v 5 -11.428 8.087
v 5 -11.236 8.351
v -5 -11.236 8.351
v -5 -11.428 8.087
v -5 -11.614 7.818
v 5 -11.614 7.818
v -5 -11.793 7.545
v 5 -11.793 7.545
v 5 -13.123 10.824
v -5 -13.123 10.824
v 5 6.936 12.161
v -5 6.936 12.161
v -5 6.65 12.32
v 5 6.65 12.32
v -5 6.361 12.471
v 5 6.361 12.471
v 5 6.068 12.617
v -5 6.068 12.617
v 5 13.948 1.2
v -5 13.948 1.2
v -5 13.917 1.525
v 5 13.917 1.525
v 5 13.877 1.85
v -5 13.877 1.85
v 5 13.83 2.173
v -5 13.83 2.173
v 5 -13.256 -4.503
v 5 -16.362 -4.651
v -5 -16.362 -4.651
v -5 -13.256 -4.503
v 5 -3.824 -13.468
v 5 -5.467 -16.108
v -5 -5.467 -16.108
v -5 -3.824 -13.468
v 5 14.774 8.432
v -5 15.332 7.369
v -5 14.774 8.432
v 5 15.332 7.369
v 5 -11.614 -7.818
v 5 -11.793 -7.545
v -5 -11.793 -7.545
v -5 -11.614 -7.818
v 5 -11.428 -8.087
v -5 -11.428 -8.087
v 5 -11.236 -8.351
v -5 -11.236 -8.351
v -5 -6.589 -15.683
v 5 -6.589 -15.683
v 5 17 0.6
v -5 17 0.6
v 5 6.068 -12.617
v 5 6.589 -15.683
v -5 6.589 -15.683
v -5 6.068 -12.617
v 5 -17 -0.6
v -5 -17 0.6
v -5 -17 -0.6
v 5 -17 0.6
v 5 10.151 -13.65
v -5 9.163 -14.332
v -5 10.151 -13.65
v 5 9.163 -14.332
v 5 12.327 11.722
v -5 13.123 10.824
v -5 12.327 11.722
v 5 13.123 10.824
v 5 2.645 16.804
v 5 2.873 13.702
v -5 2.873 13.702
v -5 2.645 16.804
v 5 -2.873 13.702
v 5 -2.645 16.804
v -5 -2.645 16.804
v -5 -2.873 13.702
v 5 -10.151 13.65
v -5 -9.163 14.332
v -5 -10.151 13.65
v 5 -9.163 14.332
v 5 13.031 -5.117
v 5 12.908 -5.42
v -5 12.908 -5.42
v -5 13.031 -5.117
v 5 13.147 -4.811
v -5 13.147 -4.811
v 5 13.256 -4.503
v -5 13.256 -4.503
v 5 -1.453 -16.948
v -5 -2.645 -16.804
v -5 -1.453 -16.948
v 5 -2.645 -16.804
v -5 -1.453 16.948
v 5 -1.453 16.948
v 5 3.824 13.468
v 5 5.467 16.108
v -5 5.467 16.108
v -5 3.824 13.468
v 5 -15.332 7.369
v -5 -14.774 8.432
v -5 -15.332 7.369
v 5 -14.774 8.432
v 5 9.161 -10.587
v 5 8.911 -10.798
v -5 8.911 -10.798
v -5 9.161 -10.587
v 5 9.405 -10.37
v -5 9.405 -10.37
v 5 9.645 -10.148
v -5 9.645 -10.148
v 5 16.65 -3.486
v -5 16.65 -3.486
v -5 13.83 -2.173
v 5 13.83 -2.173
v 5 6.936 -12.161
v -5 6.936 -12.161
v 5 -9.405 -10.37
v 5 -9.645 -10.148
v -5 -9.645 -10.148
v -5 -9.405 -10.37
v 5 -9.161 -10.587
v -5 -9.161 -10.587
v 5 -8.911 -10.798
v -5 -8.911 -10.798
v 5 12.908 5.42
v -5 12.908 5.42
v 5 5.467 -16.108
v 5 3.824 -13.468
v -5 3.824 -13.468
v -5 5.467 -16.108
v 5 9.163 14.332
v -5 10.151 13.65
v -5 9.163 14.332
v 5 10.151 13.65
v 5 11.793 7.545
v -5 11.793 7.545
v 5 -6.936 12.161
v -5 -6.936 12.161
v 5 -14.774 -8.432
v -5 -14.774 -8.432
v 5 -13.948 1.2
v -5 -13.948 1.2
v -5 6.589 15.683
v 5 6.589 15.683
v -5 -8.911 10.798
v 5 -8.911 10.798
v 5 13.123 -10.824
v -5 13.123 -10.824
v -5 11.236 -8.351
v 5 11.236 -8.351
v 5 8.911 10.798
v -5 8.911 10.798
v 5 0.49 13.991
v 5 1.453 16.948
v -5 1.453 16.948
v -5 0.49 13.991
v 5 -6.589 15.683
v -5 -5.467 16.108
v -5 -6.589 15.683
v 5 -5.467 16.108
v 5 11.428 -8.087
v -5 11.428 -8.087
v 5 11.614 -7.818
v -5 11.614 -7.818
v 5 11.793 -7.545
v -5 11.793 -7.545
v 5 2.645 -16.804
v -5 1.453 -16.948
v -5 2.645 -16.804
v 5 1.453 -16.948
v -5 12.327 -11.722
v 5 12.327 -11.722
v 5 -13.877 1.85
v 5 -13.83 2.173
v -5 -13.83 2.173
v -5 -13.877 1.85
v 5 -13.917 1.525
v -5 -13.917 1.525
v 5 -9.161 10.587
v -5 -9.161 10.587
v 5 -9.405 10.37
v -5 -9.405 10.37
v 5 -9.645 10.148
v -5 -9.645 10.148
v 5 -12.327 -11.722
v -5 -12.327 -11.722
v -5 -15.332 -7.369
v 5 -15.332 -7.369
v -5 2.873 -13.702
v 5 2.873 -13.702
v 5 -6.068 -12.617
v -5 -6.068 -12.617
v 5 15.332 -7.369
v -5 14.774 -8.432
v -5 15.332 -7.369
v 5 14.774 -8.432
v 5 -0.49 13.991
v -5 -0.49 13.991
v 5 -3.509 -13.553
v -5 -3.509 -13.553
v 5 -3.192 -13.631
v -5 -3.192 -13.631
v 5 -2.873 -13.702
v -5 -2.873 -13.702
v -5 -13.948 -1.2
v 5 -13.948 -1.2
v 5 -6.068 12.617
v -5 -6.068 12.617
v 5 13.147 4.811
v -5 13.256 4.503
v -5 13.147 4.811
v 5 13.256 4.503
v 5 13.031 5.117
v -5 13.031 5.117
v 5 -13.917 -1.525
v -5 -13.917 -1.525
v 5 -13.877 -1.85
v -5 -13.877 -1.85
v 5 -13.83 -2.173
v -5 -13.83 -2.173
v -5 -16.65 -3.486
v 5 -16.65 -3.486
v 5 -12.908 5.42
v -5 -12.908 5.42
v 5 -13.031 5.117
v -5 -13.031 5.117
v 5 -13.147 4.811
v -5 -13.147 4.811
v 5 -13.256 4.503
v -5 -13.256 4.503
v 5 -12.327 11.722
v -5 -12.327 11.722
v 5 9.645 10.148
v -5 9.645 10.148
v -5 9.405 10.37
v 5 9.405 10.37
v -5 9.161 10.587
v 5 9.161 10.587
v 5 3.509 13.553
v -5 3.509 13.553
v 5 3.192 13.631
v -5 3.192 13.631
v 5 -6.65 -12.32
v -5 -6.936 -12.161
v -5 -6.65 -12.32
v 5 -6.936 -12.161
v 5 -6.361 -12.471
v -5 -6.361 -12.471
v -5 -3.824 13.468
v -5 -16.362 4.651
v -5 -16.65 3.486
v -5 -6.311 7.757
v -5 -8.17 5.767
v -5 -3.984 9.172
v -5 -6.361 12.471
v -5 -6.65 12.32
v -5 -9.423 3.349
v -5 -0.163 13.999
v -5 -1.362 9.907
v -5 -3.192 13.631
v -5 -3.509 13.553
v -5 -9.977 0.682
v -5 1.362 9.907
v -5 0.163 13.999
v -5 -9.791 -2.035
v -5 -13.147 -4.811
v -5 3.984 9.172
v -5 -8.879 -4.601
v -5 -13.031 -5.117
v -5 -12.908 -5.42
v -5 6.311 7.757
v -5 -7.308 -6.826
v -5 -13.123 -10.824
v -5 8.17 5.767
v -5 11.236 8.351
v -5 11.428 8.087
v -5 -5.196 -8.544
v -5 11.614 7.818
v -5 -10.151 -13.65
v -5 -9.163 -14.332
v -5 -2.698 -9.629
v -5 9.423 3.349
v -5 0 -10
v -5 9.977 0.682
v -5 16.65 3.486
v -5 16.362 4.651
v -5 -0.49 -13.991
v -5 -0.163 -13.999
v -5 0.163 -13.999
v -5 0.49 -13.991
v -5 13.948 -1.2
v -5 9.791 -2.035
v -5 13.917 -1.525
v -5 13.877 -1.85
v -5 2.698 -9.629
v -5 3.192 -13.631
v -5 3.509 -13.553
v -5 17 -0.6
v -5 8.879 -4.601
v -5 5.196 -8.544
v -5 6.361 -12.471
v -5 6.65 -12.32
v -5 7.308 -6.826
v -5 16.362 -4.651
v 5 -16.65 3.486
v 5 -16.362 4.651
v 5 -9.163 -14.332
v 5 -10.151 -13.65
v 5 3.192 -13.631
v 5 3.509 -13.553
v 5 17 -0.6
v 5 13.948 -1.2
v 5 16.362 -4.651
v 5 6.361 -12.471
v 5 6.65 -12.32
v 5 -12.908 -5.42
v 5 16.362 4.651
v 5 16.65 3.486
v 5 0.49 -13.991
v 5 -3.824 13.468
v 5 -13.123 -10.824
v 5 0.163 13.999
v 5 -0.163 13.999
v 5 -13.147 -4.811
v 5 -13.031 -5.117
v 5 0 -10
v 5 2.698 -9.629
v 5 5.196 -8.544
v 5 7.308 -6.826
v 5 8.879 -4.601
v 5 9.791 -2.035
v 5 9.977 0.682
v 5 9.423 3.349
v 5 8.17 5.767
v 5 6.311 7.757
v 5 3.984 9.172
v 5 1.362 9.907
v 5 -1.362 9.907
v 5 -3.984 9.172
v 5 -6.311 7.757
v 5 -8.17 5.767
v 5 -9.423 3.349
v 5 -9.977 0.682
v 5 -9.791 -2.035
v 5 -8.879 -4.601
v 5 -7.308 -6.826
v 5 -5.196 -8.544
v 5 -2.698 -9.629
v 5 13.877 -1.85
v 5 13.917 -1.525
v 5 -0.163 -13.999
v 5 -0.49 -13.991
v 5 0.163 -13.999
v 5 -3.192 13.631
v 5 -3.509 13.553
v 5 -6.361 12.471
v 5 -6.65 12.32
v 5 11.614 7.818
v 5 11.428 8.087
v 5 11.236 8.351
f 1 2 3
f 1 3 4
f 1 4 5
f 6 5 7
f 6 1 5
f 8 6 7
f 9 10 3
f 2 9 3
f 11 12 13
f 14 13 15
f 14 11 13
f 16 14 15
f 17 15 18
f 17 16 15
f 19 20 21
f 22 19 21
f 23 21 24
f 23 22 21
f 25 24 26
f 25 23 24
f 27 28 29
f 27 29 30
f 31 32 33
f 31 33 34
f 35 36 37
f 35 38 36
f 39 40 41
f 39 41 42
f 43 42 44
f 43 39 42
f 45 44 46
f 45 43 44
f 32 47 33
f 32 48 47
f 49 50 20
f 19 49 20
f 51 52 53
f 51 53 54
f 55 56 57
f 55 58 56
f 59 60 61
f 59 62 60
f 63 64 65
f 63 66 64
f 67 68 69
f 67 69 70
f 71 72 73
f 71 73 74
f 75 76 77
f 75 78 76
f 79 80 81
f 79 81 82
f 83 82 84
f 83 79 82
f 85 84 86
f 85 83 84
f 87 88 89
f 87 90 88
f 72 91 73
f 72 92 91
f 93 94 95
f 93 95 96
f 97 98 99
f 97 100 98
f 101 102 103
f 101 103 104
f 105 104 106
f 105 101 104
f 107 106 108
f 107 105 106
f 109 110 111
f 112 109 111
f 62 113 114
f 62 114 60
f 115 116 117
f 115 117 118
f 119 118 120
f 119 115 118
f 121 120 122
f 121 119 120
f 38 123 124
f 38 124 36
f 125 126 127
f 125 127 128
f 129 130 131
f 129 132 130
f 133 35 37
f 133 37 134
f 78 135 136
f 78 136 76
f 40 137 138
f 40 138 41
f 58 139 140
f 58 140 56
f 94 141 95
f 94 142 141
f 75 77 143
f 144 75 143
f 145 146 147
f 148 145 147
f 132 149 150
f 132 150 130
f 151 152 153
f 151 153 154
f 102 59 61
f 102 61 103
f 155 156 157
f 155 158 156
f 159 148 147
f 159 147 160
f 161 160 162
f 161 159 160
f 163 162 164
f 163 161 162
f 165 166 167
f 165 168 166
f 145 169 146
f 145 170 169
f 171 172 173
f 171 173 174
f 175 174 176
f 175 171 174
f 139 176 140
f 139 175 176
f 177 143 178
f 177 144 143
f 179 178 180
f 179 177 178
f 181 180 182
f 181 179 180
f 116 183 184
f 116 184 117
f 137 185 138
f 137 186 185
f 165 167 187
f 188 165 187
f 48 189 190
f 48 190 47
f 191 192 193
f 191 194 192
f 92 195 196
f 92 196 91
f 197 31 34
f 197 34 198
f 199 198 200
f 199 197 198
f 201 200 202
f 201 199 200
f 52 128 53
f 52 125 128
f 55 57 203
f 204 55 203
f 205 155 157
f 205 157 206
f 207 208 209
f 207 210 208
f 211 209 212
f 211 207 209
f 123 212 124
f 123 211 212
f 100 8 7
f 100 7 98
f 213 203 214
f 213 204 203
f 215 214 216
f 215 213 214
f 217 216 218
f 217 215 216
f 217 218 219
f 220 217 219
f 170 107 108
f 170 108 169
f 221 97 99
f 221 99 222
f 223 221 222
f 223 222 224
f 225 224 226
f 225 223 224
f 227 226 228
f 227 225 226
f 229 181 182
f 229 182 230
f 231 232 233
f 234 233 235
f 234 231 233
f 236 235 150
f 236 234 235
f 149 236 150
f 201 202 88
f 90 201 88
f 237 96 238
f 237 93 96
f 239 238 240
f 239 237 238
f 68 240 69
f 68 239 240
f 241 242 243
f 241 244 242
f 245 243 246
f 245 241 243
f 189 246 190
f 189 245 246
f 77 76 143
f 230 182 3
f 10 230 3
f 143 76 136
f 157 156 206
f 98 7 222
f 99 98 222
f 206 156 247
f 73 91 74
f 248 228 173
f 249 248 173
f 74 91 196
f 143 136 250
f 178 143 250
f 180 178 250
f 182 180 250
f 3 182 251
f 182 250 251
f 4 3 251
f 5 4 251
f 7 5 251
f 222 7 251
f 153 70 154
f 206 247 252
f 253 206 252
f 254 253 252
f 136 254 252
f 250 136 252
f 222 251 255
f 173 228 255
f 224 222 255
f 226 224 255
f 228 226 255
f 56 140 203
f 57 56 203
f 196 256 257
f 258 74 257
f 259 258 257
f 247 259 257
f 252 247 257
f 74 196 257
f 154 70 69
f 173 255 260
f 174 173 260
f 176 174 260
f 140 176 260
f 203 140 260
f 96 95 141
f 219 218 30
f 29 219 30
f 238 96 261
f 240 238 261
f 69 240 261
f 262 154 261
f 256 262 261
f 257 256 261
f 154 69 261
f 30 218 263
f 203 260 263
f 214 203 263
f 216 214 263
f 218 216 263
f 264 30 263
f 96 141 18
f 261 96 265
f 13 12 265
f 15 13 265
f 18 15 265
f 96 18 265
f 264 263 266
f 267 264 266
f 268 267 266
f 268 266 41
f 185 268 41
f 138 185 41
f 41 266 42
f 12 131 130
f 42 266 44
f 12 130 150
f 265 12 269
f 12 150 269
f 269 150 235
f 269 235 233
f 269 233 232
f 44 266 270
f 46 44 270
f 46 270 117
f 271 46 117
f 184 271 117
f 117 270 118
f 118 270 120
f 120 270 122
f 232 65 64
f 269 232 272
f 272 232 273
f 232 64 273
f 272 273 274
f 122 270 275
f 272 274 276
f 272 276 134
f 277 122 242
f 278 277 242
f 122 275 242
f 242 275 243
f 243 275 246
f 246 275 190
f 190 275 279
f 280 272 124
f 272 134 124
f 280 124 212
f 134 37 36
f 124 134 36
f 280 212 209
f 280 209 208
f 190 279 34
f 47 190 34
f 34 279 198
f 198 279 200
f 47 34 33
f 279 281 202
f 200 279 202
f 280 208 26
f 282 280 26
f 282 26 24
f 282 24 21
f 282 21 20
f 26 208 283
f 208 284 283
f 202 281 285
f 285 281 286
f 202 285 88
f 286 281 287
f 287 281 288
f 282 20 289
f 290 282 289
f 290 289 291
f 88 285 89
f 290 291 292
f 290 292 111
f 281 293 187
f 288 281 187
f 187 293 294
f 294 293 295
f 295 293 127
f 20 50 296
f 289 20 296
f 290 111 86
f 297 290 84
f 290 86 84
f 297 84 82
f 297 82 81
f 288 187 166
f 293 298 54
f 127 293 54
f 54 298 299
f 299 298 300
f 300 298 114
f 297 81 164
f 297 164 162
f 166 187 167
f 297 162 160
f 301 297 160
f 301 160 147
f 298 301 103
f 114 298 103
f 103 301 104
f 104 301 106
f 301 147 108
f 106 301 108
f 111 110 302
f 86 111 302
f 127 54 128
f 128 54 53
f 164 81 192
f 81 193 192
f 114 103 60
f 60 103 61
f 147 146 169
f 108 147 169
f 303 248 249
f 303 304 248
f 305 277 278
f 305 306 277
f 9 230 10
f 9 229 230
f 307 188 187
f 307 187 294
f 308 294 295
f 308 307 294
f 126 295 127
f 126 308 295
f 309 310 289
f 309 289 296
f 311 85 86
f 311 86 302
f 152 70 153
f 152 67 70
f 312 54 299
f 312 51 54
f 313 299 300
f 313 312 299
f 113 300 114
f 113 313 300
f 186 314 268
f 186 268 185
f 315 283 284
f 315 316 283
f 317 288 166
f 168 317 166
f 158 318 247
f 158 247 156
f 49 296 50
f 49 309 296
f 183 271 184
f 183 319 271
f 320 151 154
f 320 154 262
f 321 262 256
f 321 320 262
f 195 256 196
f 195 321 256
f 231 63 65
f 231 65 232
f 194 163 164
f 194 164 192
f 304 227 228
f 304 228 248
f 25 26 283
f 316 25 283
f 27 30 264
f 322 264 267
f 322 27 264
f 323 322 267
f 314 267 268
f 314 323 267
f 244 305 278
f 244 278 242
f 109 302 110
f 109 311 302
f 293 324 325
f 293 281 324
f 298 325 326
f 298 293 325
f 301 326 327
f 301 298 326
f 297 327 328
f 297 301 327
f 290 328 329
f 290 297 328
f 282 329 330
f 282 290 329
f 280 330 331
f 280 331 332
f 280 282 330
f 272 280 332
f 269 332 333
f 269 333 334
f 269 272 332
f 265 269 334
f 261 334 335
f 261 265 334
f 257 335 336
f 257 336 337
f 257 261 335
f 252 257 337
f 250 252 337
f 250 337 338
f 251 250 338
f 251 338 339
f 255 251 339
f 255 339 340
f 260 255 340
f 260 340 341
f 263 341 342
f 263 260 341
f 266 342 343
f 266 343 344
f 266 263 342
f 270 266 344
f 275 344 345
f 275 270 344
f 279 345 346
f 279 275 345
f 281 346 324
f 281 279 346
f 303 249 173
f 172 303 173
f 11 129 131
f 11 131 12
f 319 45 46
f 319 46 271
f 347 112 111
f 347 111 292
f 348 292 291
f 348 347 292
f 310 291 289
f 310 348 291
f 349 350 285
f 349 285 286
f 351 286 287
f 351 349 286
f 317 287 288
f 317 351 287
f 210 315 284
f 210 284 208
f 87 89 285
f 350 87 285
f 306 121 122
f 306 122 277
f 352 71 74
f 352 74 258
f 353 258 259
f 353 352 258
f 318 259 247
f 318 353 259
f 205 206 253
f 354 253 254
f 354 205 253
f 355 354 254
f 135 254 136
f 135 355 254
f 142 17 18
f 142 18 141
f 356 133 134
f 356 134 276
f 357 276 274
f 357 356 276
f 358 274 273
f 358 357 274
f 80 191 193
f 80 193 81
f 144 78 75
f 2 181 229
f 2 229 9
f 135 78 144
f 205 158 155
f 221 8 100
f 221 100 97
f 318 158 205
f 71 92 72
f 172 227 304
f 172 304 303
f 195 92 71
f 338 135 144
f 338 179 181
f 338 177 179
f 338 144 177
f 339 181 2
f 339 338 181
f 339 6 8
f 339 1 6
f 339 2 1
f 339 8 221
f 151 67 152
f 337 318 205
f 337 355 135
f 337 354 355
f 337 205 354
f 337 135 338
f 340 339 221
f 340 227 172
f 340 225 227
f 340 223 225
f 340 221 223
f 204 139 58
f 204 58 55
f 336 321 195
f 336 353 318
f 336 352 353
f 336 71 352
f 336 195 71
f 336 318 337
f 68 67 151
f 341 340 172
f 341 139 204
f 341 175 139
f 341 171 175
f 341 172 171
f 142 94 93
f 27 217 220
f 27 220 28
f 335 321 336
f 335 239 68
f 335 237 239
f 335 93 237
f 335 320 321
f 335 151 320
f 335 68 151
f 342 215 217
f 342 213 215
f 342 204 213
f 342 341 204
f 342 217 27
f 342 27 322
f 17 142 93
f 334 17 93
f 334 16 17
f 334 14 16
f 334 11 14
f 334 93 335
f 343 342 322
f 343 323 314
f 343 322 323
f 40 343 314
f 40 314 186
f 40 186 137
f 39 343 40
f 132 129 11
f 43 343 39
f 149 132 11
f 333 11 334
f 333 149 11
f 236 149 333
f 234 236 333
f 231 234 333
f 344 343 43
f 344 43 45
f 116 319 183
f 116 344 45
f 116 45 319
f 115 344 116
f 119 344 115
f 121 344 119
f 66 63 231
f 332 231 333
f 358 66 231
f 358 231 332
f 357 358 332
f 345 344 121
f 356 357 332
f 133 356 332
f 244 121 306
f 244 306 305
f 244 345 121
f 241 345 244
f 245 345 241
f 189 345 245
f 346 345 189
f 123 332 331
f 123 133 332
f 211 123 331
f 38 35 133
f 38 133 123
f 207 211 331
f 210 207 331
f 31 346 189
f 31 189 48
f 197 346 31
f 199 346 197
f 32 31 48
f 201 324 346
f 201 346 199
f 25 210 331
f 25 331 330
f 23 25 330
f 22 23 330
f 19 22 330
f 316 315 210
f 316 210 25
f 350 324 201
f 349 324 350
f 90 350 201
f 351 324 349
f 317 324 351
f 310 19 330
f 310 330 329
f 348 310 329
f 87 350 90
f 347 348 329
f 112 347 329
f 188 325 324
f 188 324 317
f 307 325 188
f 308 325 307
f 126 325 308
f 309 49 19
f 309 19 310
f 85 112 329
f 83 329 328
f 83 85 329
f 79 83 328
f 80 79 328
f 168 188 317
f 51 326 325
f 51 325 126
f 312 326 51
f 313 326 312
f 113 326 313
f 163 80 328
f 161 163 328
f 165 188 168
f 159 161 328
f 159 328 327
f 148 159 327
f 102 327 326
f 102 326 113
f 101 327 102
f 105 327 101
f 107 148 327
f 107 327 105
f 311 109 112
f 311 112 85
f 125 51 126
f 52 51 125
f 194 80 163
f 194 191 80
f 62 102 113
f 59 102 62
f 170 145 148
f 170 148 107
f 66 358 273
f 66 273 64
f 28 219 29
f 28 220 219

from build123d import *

# Parameters (mm, degrees)
SKETCH1_R           = 10
BOSS_EXTRUDE1_DEPTH = 5
BOSS_EXTRUDE2_DEPTH = 5
CIRPATTERN1_COUNT   = 26


with BuildPart() as part:
    # Sketch1 → Boss-Extrude1 (new, symmetric)
    with BuildSketch(Plane.YZ):
        with BuildLine():
            ThreePointArc((14, 0), (13.987113224, 0.600552799), (13.948476619, 1.2))
            ThreePointArc((13.948476619, 1.2), (-14, 0), (13.948476619, -1.2))
            ThreePointArc((13.948476619, -1.2), (13.987113224, -0.600552799), (14, 0))
        make_face()
        Circle(SKETCH1_R, mode=Mode.SUBTRACT)
    extrude(amount=BOSS_EXTRUDE1_DEPTH, both=True)

    # Sketch1<3> → Boss-Extrude2 (add, symmetric)
    with BuildSketch(Plane.YZ):
        with BuildLine():
            Line((17, -0.6), (17, 0.6))
            Line((17, 0.6), (13.948476619, 1.2))
            ThreePointArc((13.948476619, 1.2), (13.987113224, 0.600552799), (14, 0))
            ThreePointArc((14, 0), (13.987113224, -0.600552799), (13.948476619, -1.2))
            Line((13.948476619, -1.2), (17, -0.6))
        make_face()
    boss_extrude2 = extrude(amount=BOSS_EXTRUDE2_DEPTH, both=True)

    # CirPattern1: Boss-Extrude2 ×26 about axis
    cirpattern1_axis = Axis((5, 0, 0), (1, 0, 0))
    for i in range(1, CIRPATTERN1_COUNT):
        add(boss_extrude2.rotate(cirpattern1_axis, i * 360 / CIRPATTERN1_COUNT))


solid = part.part
